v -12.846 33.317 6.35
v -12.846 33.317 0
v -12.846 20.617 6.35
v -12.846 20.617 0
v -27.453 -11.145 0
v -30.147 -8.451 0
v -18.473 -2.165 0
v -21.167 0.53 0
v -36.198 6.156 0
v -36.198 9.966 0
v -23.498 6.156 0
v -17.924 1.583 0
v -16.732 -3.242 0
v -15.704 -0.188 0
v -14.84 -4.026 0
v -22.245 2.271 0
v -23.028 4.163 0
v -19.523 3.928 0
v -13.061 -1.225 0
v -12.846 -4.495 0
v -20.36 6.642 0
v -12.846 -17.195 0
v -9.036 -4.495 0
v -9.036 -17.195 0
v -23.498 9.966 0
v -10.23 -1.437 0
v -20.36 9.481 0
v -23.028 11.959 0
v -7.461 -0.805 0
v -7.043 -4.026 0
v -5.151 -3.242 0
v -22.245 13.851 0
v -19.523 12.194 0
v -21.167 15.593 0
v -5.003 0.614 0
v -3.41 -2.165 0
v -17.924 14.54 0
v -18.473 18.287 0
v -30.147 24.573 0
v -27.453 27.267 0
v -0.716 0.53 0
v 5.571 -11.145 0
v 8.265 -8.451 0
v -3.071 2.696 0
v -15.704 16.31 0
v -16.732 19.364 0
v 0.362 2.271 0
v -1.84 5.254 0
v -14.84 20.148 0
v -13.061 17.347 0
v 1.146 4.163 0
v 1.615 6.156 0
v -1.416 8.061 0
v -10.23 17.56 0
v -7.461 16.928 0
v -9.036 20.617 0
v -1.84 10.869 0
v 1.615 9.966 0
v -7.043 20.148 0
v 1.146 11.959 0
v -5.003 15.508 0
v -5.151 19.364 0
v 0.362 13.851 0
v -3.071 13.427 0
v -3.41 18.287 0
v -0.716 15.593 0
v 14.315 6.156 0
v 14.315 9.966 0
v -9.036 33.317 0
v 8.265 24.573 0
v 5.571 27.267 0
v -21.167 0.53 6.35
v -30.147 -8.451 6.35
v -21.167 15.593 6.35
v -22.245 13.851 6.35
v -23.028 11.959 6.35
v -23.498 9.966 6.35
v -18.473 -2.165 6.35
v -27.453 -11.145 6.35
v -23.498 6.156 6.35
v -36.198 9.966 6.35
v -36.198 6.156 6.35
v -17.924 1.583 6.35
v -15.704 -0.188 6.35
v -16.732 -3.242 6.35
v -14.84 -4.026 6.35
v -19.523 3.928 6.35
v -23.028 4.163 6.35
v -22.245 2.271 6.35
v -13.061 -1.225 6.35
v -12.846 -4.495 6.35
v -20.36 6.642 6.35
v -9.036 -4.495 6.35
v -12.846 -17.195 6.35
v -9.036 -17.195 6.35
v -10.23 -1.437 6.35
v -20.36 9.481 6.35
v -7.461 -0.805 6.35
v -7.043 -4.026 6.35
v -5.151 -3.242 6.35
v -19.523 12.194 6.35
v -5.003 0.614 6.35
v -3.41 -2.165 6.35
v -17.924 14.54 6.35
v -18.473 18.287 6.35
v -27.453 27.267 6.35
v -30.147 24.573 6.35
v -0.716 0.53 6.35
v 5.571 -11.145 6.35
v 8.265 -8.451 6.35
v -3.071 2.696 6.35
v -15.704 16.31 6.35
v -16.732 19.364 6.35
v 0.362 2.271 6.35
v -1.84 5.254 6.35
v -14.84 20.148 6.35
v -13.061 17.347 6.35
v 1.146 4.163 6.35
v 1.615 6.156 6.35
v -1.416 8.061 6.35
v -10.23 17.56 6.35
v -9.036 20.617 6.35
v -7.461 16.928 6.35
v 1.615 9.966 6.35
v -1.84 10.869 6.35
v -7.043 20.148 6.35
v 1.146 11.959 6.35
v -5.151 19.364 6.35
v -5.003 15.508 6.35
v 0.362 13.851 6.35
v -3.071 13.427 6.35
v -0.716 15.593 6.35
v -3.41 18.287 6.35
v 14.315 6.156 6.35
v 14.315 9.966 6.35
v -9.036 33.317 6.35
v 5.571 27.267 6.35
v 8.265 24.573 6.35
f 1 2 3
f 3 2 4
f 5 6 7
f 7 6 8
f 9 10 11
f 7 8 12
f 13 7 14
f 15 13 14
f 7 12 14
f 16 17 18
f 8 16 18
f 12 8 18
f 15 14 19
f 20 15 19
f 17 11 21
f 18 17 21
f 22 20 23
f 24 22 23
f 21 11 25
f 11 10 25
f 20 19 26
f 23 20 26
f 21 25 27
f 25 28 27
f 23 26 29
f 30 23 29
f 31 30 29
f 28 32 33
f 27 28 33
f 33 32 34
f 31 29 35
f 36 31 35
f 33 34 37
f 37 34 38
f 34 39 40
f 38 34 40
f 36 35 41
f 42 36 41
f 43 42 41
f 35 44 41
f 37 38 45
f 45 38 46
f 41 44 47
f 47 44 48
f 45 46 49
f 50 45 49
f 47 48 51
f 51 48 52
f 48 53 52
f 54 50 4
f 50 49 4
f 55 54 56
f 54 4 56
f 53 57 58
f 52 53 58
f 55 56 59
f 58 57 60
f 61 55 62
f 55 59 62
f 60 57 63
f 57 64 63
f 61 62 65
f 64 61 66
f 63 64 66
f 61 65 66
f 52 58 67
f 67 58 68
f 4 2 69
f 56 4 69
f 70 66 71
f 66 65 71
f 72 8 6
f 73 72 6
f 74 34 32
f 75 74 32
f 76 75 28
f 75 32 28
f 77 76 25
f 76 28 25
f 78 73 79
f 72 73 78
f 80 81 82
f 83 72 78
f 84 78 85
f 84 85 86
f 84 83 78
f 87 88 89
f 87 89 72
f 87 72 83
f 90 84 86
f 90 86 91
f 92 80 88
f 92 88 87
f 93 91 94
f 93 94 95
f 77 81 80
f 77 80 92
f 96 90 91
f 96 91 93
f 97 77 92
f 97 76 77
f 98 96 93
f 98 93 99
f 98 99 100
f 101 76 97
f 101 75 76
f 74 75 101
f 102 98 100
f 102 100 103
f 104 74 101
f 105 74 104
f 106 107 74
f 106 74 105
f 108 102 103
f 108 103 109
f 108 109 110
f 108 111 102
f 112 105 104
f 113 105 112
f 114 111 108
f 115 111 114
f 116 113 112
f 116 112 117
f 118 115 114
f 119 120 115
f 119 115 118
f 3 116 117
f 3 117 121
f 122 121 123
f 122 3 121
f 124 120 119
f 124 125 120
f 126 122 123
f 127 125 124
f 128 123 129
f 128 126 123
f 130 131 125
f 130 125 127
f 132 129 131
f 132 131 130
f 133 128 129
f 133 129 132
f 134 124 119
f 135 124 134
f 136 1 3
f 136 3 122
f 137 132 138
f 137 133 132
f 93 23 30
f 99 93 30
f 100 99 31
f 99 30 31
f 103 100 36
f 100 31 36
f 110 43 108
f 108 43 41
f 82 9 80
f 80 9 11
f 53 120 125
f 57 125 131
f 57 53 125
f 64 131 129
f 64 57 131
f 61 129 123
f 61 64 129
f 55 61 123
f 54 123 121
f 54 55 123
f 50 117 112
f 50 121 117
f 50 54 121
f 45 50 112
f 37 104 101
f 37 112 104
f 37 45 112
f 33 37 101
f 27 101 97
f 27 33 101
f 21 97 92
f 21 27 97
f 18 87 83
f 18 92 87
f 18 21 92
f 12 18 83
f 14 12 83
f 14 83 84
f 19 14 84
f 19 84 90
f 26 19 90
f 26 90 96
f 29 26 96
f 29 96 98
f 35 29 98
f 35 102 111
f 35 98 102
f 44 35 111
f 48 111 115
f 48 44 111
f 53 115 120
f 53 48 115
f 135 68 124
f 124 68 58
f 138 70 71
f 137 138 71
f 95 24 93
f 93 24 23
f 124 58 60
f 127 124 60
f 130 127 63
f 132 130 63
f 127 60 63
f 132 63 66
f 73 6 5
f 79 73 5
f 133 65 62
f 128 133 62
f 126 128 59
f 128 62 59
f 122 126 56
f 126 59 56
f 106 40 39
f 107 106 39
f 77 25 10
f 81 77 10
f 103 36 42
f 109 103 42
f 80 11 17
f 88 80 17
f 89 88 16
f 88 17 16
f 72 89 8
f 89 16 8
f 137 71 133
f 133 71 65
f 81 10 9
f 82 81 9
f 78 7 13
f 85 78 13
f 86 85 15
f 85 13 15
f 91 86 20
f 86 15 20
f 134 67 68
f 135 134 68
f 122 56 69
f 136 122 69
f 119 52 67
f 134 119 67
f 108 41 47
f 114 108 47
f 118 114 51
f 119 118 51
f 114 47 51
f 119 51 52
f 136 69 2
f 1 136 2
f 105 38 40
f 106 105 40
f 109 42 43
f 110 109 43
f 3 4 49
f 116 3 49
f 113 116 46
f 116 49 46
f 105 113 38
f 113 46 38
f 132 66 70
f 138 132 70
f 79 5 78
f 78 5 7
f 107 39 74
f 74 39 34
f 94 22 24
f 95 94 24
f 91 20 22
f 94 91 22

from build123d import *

# Parameters (mm, degrees)
F0_R     = 9.525
F1_DEPTH = 6.35
F2_COUNT = 8


with BuildPart() as f1:
    # F0 (on Top) → F1 (new body)
    with BuildSketch(Plane.XY):
        with BuildLine():
            ThreePointArc((-12.8463400356, 20.6174660121), (-19.2207270902, -1.5690979595), (1.7586599644, 8.0611538545))
            ThreePointArc((1.7586599644, 8.0611538545), (-1.3110882217, 16.3405409091), (-9.0363400356, 20.6174660121))
            Line((-9.0363400356, 20.6174660121), (-12.8463400356, 20.6174660121))
        make_face()
        with Locations((-10.9413400356, 8.0611538545)):
            Circle(F0_R, mode=Mode.SUBTRACT)
        with BuildLine():
            Line((-12.8463400356, 20.6174660121), (-9.0363400356, 20.6174660121))
            ThreePointArc((-9.0363400356, 20.6174660121), (-10.9413400356, 20.7611538545), (-12.8463400356, 20.6174660121))
        make_face()
        with BuildLine():
            ThreePointArc((-12.8463400356, 20.6174660121), (-10.9413400356, 20.7611538545), (-9.0363400356, 20.6174660121))
            Line((-9.0363400356, 20.6174660121), (-9.0363400356, 33.3174660121))
            Line((-9.0363400356, 33.3174660121), (-12.8463400356, 33.3174660121))
            Line((-12.8463400356, 33.3174660121), (-12.8463400356, 20.6174660121))
        make_face()
    extrude(amount=F1_DEPTH)

    # F2: F1 ×8 about axis
    f2_axis = Axis((-10.9413400356, 8.0611538545, 6.35), (0, 0, 1))


with BuildPart() as f1_1:
    add(f1.part)
    for i in range(1, F2_COUNT):
        add(f1.part.rotate(f2_axis, i * 360 / F2_COUNT))


solid = f1_1.part
